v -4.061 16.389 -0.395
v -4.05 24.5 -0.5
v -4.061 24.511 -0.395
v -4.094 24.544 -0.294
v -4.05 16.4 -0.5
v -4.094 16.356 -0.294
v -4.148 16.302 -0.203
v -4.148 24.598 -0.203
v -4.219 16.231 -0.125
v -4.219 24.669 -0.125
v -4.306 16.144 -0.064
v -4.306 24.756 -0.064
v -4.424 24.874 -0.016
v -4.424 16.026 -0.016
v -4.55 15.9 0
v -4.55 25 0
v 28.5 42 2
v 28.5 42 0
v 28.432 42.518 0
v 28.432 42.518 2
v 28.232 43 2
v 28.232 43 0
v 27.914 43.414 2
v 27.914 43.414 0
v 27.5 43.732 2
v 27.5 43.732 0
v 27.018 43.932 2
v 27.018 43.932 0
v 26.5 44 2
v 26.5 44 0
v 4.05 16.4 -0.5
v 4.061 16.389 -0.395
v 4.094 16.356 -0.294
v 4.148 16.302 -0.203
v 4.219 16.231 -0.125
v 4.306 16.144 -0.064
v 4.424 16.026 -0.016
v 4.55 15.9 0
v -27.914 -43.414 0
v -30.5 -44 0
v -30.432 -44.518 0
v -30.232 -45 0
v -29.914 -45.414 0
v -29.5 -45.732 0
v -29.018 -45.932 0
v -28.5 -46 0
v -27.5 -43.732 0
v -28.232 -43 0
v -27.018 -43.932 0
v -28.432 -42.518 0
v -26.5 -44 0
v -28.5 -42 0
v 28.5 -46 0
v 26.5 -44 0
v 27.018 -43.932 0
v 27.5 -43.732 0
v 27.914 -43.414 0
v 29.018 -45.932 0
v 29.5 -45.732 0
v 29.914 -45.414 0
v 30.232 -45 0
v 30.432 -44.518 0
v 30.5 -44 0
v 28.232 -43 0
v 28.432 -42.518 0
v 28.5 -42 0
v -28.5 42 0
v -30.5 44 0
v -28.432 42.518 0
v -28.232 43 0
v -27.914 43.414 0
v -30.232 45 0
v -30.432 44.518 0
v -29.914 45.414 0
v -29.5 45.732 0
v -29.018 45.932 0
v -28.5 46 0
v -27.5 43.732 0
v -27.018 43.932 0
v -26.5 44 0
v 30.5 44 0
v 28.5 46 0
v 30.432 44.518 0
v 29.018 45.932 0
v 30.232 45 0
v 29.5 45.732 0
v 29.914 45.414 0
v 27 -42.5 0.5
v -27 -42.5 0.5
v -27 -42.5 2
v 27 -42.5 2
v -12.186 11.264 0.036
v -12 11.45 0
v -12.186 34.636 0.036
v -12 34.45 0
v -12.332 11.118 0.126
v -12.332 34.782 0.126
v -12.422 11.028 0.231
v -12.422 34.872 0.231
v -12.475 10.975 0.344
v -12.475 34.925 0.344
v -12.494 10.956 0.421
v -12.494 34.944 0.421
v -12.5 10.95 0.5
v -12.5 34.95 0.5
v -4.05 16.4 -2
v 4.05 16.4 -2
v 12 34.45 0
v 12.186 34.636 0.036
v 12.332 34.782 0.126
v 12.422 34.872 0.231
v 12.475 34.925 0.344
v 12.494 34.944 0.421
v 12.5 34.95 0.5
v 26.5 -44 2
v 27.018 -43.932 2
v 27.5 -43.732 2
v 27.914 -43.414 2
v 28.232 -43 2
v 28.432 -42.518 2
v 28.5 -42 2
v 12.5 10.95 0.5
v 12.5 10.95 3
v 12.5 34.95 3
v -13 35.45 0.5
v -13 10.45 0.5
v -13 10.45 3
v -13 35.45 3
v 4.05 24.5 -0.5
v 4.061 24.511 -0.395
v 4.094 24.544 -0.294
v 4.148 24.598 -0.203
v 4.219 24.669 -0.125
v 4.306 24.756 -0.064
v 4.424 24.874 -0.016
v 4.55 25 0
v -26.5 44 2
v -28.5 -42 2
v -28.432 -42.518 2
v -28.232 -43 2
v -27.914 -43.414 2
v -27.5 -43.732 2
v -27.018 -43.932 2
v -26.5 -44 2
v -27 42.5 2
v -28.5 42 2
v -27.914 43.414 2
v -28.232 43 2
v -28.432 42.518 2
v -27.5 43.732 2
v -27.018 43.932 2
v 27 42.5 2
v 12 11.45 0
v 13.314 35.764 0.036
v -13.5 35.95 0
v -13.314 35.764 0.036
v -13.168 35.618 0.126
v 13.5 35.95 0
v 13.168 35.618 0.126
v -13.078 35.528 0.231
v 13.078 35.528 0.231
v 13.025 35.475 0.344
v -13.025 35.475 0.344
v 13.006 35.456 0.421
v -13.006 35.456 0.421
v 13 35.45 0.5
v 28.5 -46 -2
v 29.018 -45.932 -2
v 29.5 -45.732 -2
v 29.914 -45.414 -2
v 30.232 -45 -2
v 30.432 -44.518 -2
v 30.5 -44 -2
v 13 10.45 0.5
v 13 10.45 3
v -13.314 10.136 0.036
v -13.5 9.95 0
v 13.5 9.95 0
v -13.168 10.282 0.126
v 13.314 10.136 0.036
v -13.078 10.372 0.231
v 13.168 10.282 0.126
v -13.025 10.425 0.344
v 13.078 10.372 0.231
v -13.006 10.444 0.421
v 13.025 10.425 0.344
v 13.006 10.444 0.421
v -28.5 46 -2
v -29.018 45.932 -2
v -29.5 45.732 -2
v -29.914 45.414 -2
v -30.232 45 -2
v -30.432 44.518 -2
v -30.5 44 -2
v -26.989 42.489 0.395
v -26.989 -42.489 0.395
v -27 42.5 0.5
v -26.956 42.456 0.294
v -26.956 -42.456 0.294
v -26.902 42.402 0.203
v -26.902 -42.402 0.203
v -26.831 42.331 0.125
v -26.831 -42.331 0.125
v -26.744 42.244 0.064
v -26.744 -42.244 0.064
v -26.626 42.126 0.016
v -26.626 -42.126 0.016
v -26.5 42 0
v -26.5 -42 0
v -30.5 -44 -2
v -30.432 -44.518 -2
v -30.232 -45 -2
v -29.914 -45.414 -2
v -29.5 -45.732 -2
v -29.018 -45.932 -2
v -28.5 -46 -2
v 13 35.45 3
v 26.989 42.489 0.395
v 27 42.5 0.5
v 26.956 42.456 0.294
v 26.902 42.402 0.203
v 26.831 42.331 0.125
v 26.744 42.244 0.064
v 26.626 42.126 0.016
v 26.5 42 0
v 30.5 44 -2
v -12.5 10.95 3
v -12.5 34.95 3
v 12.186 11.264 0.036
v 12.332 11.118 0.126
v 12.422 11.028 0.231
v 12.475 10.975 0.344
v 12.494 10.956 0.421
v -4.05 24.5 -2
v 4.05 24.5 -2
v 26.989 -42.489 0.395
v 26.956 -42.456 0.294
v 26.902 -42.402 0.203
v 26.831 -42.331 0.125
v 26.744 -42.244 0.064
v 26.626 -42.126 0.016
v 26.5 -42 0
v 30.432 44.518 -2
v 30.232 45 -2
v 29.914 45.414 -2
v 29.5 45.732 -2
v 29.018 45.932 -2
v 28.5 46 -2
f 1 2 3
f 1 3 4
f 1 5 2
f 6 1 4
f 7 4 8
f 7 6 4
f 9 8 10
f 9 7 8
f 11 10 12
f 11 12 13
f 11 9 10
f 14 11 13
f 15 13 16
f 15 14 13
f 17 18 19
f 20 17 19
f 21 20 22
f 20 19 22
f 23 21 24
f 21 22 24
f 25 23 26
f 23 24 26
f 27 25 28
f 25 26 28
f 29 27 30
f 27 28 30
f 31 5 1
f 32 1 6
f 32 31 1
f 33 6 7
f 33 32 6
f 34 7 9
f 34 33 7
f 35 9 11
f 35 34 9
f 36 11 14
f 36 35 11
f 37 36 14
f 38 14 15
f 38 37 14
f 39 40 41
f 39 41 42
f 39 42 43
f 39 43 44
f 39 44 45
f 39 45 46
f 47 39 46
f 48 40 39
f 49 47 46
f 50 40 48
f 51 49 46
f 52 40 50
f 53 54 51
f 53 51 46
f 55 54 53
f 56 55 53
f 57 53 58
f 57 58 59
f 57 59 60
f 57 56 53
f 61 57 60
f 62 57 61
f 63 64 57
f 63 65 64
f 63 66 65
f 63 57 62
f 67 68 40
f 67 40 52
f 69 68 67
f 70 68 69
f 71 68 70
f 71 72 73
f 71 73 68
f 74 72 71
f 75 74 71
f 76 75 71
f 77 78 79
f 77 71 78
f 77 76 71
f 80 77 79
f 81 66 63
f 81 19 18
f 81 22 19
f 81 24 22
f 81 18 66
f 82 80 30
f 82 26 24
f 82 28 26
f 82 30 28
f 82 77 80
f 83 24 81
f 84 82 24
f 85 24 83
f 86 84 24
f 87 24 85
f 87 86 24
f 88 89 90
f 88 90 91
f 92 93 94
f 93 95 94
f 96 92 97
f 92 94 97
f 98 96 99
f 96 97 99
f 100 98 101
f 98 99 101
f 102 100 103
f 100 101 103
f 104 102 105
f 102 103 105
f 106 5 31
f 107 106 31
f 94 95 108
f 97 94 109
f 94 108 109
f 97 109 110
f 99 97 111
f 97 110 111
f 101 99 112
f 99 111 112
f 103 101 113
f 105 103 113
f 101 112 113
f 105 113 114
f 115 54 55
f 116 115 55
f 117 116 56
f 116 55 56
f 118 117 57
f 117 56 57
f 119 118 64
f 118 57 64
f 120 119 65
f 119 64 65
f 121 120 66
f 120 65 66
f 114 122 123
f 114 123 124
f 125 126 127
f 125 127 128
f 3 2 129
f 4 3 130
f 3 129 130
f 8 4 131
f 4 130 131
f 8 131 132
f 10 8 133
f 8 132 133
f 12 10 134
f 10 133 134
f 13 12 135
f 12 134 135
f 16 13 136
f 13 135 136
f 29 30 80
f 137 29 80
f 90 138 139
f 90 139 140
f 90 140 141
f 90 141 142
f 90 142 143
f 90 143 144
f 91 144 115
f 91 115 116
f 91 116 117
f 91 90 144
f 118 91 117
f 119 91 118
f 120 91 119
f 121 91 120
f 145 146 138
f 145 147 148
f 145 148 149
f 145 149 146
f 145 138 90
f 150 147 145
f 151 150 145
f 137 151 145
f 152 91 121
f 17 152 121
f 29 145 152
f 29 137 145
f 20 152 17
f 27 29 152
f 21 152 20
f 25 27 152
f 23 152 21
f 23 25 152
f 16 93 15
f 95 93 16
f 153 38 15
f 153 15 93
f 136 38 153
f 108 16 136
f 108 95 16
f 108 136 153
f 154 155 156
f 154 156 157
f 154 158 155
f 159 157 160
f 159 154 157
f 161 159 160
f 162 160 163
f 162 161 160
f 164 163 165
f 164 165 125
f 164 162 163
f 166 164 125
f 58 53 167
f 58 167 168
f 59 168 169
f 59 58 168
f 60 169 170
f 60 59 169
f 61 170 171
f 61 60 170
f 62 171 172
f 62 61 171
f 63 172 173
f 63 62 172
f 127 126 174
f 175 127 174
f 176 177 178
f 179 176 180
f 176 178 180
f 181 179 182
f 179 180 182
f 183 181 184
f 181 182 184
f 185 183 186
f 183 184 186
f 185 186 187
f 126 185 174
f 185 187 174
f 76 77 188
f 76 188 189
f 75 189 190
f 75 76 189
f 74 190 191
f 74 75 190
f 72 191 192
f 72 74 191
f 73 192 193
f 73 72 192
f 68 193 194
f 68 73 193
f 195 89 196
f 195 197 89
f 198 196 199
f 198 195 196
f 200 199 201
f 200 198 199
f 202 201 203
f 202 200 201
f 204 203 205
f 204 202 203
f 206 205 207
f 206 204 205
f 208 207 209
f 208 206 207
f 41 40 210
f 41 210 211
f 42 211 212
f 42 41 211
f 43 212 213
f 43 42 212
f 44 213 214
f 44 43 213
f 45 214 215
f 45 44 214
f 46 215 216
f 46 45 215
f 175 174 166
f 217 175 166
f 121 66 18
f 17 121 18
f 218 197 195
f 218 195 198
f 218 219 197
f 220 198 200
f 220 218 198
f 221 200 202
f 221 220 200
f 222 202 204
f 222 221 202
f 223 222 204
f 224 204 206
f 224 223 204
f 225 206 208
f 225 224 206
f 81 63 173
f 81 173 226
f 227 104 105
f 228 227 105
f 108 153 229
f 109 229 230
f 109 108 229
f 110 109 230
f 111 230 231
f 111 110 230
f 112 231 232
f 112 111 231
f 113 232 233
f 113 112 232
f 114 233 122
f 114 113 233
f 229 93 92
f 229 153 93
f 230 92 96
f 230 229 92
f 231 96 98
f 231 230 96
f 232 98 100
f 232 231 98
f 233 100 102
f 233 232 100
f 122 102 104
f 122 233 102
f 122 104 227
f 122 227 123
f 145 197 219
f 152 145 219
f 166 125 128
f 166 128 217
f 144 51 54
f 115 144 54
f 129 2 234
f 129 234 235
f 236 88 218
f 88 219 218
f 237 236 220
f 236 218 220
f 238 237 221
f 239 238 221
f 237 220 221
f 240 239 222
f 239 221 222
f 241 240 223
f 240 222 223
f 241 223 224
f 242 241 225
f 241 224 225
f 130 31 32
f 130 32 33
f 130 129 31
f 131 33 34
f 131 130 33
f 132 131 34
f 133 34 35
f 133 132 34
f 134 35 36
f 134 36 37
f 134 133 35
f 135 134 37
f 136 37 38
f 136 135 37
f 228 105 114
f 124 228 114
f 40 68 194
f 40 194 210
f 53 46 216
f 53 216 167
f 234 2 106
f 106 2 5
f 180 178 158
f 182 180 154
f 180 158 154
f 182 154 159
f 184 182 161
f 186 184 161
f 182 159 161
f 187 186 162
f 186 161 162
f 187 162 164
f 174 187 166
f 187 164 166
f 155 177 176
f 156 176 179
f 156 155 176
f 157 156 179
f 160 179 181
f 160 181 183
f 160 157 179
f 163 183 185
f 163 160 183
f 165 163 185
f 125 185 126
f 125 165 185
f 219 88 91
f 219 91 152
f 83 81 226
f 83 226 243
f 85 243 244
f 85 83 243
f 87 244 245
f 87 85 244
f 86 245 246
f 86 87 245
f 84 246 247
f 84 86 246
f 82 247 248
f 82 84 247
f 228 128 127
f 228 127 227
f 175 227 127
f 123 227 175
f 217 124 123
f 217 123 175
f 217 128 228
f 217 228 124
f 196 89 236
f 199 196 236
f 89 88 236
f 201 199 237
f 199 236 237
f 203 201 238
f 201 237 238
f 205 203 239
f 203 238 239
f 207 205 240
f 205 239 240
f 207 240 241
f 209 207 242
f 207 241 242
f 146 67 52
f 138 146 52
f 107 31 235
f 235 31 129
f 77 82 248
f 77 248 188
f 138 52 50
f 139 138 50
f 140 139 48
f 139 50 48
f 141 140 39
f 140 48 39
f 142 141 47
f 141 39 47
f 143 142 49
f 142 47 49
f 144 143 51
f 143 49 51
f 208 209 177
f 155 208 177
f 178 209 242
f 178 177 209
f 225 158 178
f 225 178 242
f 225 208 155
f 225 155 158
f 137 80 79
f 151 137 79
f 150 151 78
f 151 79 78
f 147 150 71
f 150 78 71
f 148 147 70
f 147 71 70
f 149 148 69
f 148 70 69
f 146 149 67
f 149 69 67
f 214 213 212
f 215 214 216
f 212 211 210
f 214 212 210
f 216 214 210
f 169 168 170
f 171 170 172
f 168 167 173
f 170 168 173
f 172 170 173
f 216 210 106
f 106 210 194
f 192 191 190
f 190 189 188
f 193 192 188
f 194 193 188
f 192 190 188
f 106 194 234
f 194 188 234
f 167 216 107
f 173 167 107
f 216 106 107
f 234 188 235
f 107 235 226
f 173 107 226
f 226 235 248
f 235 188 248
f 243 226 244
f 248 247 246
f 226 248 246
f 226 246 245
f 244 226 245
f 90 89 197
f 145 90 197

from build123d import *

# Parameters (mm, degrees)
F0_W     = 54
F0_H     = 85
F1_DEPTH = 2
F2_DEPTH = 2
F3_W     = 26
F3_H     = 25
F3_W_2   = 25
F3_H_2   = 24
F4_DEPTH = 3
F3_W_3   = 8.1
F3_H_3   = 4.05
F5_DEPTH = 2
F6_R     = 0.5


with BuildPart() as f1:
    # F0 (on Top) → F1 (new body)
    with BuildSketch(Plane.XY):
        with BuildLine():
            Line((-30.5, 44), (-30.5, 0))
            Line((-30.5, 0), (-30.5, -44))
            ThreePointArc((-30.5, -44), (-29.9142135624, -45.4142135624), (-28.5, -46))
            Line((-28.5, -46), (28.5, -46))
            ThreePointArc((28.5, -46), (29.9142135624, -45.4142135624), (30.5, -44))
            Line((30.5, -44), (30.5, 0))
            Line((30.5, 0), (30.5, 44))
            ThreePointArc((30.5, 44), (29.9142135624, 45.4142135624), (28.5, 46))
            Line((28.5, 46), (-28.5, 46))
            ThreePointArc((-28.5, 46), (-29.9142135624, 45.4142135624), (-30.5, 44))
        make_face()
        with BuildLine():
            Line((-28.5, -42), (-28.5, 0))
            Line((-28.5, 0), (-28.5, 42))
            ThreePointArc((-28.5, 42), (-27.9142135624, 43.4142135624), (-26.5, 44))
            Line((-26.5, 44), (26.5, 44))
            ThreePointArc((26.5, 44), (27.9142135624, 43.4142135624), (28.5, 42))
            Line((28.5, 42), (28.5, 0))
            Line((28.5, 0), (28.5, -42))
            ThreePointArc((28.5, -42), (27.9142135624, -43.4142135624), (26.5, -44))
            Line((26.5, -44), (-26.5, -44))
            ThreePointArc((-26.5, -44), (-27.9142135624, -43.4142135624), (-28.5, -42))
        make_face(mode=Mode.SUBTRACT)
        with BuildLine():
            Line((-28.5, 42), (-28.5, 0))
            Line((-28.5, 0), (-28.5, -42))
            ThreePointArc((-28.5, -42), (-27.9142135624, -43.4142135624), (-26.5, -44))
            Line((-26.5, -44), (26.5, -44))
            ThreePointArc((26.5, -44), (27.9142135624, -43.4142135624), (28.5, -42))
            Line((28.5, -42), (28.5, 0))
            Line((28.5, 0), (28.5, 42))
            ThreePointArc((28.5, 42), (27.9142135624, 43.4142135624), (26.5, 44))
            Line((26.5, 44), (-26.5, 44))
            ThreePointArc((-26.5, 44), (-27.9142135624, 43.4142135624), (-28.5, 42))
        make_face()
        Rectangle(F0_W, F0_H, mode=Mode.SUBTRACT)
        Rectangle(F0_W, F0_H)
    extrude(amount=-F1_DEPTH)

    # F0 (on Top) → F2 (join)
    with BuildSketch(Plane.XY):
        with BuildLine():
            Line((-28.5, 42), (-28.5, 0))
            Line((-28.5, 0), (-28.5, -42))
            ThreePointArc((-28.5, -42), (-27.9142135624, -43.4142135624), (-26.5, -44))
            Line((-26.5, -44), (26.5, -44))
            ThreePointArc((26.5, -44), (27.9142135624, -43.4142135624), (28.5, -42))
            Line((28.5, -42), (28.5, 0))
            Line((28.5, 0), (28.5, 42))
            ThreePointArc((28.5, 42), (27.9142135624, 43.4142135624), (26.5, 44))
            Line((26.5, 44), (-26.5, 44))
            ThreePointArc((-26.5, 44), (-27.9142135624, 43.4142135624), (-28.5, 42))
        make_face()
        Rectangle(F0_W, F0_H, mode=Mode.SUBTRACT)
    extrude(amount=F2_DEPTH)

    # F3 (on Top) → F4 (join)
    with BuildSketch(Plane.XY):
        with Locations((0, 22.95)):
            Rectangle(F3_W, F3_H)
        with Locations((0, 22.95)):
            Rectangle(F3_W_2, F3_H_2, mode=Mode.SUBTRACT)
    extrude(amount=F4_DEPTH)

    # F3 (on Top) → F5 (cut, through all)
    with BuildSketch(Plane.XY):
        with Locations((0, 18.425)):
            Rectangle(F3_W_3, F3_H_3)
        with Locations((0, 22.475)):
            Rectangle(F3_W_3, F3_H_3)
    extrude(amount=-F5_DEPTH, mode=Mode.SUBTRACT)

    # F6
    f6_edges = [f1.edges().sort_by_distance(p)[0] for p in [
        (-12.5, 22.95, 0),
        (0, 10.95, 0),
        (0, 34.95, 0),
        (12.5, 22.95, 0),
        (0, 16.4, 0),
        (4.05, 20.45, 0),
        (0, 24.5, 0),
        (-4.05, 20.45, 0),
        (-27, 0, 0),
        (0, -42.5, 0),
        (0, 42.5, 0),
        (27, 0, 0),
        (0, 35.45, 0),
        (-13, 22.95, 0),
        (0, 10.45, 0),
        (13, 22.95, 0),
    ]]
    fillet(f6_edges, radius=F6_R)


solid = f1.part
